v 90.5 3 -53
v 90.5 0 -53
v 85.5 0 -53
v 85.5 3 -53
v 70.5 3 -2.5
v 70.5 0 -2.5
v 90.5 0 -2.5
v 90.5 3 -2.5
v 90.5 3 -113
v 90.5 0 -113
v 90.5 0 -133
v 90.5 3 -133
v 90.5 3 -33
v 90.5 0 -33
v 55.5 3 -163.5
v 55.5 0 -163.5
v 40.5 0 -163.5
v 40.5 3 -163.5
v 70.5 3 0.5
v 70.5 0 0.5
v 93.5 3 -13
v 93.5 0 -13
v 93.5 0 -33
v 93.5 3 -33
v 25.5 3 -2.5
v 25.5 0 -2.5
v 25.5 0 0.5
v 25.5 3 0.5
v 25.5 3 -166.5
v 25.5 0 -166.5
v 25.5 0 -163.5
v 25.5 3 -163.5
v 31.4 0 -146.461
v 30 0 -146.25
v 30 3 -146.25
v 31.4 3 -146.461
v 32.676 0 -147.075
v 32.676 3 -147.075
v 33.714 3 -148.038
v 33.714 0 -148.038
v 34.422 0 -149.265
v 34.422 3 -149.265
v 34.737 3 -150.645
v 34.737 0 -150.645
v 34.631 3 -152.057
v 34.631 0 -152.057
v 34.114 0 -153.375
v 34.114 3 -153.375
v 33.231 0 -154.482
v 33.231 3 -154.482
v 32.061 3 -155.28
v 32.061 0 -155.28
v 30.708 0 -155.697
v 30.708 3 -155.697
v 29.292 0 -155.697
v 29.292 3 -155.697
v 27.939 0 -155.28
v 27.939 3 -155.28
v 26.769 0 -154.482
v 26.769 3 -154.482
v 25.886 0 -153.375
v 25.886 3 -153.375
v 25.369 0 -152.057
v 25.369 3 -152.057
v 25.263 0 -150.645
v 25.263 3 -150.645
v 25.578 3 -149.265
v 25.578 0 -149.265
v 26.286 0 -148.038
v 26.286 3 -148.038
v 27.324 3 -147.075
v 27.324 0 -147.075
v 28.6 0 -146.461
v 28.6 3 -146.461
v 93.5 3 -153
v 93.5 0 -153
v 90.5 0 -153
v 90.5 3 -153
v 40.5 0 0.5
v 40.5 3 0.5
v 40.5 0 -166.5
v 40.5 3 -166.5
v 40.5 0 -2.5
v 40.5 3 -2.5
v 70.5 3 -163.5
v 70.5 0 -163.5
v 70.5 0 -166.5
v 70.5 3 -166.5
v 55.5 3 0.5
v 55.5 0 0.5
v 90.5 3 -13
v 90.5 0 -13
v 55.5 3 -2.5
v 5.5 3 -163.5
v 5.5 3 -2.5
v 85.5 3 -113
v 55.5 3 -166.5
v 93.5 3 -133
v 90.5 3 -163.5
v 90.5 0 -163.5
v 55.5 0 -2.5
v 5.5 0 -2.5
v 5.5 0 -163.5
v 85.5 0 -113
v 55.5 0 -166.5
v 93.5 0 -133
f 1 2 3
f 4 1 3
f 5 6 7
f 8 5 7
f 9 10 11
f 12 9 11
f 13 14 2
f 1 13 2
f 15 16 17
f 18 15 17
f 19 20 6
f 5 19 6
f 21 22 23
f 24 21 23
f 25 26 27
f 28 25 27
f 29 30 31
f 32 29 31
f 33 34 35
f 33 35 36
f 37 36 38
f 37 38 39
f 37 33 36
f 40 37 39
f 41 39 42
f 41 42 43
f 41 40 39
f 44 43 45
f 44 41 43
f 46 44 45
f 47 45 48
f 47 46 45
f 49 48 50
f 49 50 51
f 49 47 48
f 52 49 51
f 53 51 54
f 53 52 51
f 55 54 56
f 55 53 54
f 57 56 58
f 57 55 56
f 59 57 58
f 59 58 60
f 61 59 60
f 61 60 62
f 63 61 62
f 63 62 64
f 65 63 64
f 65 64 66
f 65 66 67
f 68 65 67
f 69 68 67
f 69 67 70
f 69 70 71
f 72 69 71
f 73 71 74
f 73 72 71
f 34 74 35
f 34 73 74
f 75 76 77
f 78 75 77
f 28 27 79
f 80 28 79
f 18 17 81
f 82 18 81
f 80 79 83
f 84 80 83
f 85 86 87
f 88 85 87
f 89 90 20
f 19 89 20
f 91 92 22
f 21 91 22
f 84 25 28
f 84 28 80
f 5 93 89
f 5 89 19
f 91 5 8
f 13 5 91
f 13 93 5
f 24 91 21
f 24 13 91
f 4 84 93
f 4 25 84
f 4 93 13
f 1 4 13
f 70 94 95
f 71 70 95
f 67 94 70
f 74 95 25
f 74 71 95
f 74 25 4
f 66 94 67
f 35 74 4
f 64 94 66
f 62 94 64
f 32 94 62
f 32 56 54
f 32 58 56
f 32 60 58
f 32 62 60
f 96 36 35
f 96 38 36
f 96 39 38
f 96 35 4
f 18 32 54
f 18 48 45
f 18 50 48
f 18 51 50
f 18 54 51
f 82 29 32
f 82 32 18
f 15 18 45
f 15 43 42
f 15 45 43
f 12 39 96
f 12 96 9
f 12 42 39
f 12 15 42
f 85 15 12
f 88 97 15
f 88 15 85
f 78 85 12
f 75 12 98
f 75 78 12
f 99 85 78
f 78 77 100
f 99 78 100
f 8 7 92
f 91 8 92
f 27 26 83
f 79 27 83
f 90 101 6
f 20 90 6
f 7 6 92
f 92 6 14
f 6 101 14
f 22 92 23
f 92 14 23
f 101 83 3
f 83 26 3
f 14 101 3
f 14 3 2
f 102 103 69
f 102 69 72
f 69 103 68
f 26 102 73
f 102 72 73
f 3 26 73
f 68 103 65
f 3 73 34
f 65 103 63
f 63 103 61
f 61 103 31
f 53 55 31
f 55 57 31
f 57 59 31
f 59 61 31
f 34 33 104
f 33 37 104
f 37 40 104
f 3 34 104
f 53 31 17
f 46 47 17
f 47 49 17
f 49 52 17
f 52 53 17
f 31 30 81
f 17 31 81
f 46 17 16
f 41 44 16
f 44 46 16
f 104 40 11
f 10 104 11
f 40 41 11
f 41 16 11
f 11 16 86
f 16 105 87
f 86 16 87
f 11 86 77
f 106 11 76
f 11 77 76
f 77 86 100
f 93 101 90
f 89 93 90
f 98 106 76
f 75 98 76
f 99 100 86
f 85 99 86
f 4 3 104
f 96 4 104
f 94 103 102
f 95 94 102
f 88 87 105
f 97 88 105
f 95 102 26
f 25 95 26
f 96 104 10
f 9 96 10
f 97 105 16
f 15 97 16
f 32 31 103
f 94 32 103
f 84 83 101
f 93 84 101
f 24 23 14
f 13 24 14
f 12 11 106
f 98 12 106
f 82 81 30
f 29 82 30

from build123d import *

# Parameters (mm, degrees)
CROQUIS1_R              = 4.75
SALIENTE_EXTRUIR1_DEPTH = 3


with BuildPart() as part:
    # Croquis1 → Saliente-Extruir1 (new body)
    with BuildSketch(Plane(origin=(0, 0, 0), x_dir=(1, 0, 0), z_dir=(0, 1, 0))):
        Polygon((25.5, 2.5), (25.5, -0.5), (40.5, -0.5), (40.5, 2.5), (55.5, 2.5), (55.5, -0.5), (70.5, -0.5), (70.5, 2.5), (90.5, 2.5), (90.5, 13), (93.5, 13), (93.5, 33), (90.5, 33), (90.5, 53), (85.5, 53), (85.5, 113), (90.5, 113), (90.5, 133), (93.5, 133), (93.5, 153), (90.5, 153), (90.5, 163.5), (70.5, 163.5), (70.5, 166.5), (55.5, 166.5), (55.5, 163.5), (40.5, 163.5), (40.5, 166.5), (25.5, 166.5), (25.5, 163.5), (5.5, 163.5), (5.5, 153), (5.5, 133), (5.5, 113), (5.5, 93), (5.5, 73), (5.5, 53), (5.5, 33), (5.5, 13), (5.5, 2.5), align=None)
        with Locations(Location((30, 151, 0), (0, 0, 270))):
            Circle(CROQUIS1_R, mode=Mode.SUBTRACT)
    extrude(amount=SALIENTE_EXTRUIR1_DEPTH)


solid = part.part
